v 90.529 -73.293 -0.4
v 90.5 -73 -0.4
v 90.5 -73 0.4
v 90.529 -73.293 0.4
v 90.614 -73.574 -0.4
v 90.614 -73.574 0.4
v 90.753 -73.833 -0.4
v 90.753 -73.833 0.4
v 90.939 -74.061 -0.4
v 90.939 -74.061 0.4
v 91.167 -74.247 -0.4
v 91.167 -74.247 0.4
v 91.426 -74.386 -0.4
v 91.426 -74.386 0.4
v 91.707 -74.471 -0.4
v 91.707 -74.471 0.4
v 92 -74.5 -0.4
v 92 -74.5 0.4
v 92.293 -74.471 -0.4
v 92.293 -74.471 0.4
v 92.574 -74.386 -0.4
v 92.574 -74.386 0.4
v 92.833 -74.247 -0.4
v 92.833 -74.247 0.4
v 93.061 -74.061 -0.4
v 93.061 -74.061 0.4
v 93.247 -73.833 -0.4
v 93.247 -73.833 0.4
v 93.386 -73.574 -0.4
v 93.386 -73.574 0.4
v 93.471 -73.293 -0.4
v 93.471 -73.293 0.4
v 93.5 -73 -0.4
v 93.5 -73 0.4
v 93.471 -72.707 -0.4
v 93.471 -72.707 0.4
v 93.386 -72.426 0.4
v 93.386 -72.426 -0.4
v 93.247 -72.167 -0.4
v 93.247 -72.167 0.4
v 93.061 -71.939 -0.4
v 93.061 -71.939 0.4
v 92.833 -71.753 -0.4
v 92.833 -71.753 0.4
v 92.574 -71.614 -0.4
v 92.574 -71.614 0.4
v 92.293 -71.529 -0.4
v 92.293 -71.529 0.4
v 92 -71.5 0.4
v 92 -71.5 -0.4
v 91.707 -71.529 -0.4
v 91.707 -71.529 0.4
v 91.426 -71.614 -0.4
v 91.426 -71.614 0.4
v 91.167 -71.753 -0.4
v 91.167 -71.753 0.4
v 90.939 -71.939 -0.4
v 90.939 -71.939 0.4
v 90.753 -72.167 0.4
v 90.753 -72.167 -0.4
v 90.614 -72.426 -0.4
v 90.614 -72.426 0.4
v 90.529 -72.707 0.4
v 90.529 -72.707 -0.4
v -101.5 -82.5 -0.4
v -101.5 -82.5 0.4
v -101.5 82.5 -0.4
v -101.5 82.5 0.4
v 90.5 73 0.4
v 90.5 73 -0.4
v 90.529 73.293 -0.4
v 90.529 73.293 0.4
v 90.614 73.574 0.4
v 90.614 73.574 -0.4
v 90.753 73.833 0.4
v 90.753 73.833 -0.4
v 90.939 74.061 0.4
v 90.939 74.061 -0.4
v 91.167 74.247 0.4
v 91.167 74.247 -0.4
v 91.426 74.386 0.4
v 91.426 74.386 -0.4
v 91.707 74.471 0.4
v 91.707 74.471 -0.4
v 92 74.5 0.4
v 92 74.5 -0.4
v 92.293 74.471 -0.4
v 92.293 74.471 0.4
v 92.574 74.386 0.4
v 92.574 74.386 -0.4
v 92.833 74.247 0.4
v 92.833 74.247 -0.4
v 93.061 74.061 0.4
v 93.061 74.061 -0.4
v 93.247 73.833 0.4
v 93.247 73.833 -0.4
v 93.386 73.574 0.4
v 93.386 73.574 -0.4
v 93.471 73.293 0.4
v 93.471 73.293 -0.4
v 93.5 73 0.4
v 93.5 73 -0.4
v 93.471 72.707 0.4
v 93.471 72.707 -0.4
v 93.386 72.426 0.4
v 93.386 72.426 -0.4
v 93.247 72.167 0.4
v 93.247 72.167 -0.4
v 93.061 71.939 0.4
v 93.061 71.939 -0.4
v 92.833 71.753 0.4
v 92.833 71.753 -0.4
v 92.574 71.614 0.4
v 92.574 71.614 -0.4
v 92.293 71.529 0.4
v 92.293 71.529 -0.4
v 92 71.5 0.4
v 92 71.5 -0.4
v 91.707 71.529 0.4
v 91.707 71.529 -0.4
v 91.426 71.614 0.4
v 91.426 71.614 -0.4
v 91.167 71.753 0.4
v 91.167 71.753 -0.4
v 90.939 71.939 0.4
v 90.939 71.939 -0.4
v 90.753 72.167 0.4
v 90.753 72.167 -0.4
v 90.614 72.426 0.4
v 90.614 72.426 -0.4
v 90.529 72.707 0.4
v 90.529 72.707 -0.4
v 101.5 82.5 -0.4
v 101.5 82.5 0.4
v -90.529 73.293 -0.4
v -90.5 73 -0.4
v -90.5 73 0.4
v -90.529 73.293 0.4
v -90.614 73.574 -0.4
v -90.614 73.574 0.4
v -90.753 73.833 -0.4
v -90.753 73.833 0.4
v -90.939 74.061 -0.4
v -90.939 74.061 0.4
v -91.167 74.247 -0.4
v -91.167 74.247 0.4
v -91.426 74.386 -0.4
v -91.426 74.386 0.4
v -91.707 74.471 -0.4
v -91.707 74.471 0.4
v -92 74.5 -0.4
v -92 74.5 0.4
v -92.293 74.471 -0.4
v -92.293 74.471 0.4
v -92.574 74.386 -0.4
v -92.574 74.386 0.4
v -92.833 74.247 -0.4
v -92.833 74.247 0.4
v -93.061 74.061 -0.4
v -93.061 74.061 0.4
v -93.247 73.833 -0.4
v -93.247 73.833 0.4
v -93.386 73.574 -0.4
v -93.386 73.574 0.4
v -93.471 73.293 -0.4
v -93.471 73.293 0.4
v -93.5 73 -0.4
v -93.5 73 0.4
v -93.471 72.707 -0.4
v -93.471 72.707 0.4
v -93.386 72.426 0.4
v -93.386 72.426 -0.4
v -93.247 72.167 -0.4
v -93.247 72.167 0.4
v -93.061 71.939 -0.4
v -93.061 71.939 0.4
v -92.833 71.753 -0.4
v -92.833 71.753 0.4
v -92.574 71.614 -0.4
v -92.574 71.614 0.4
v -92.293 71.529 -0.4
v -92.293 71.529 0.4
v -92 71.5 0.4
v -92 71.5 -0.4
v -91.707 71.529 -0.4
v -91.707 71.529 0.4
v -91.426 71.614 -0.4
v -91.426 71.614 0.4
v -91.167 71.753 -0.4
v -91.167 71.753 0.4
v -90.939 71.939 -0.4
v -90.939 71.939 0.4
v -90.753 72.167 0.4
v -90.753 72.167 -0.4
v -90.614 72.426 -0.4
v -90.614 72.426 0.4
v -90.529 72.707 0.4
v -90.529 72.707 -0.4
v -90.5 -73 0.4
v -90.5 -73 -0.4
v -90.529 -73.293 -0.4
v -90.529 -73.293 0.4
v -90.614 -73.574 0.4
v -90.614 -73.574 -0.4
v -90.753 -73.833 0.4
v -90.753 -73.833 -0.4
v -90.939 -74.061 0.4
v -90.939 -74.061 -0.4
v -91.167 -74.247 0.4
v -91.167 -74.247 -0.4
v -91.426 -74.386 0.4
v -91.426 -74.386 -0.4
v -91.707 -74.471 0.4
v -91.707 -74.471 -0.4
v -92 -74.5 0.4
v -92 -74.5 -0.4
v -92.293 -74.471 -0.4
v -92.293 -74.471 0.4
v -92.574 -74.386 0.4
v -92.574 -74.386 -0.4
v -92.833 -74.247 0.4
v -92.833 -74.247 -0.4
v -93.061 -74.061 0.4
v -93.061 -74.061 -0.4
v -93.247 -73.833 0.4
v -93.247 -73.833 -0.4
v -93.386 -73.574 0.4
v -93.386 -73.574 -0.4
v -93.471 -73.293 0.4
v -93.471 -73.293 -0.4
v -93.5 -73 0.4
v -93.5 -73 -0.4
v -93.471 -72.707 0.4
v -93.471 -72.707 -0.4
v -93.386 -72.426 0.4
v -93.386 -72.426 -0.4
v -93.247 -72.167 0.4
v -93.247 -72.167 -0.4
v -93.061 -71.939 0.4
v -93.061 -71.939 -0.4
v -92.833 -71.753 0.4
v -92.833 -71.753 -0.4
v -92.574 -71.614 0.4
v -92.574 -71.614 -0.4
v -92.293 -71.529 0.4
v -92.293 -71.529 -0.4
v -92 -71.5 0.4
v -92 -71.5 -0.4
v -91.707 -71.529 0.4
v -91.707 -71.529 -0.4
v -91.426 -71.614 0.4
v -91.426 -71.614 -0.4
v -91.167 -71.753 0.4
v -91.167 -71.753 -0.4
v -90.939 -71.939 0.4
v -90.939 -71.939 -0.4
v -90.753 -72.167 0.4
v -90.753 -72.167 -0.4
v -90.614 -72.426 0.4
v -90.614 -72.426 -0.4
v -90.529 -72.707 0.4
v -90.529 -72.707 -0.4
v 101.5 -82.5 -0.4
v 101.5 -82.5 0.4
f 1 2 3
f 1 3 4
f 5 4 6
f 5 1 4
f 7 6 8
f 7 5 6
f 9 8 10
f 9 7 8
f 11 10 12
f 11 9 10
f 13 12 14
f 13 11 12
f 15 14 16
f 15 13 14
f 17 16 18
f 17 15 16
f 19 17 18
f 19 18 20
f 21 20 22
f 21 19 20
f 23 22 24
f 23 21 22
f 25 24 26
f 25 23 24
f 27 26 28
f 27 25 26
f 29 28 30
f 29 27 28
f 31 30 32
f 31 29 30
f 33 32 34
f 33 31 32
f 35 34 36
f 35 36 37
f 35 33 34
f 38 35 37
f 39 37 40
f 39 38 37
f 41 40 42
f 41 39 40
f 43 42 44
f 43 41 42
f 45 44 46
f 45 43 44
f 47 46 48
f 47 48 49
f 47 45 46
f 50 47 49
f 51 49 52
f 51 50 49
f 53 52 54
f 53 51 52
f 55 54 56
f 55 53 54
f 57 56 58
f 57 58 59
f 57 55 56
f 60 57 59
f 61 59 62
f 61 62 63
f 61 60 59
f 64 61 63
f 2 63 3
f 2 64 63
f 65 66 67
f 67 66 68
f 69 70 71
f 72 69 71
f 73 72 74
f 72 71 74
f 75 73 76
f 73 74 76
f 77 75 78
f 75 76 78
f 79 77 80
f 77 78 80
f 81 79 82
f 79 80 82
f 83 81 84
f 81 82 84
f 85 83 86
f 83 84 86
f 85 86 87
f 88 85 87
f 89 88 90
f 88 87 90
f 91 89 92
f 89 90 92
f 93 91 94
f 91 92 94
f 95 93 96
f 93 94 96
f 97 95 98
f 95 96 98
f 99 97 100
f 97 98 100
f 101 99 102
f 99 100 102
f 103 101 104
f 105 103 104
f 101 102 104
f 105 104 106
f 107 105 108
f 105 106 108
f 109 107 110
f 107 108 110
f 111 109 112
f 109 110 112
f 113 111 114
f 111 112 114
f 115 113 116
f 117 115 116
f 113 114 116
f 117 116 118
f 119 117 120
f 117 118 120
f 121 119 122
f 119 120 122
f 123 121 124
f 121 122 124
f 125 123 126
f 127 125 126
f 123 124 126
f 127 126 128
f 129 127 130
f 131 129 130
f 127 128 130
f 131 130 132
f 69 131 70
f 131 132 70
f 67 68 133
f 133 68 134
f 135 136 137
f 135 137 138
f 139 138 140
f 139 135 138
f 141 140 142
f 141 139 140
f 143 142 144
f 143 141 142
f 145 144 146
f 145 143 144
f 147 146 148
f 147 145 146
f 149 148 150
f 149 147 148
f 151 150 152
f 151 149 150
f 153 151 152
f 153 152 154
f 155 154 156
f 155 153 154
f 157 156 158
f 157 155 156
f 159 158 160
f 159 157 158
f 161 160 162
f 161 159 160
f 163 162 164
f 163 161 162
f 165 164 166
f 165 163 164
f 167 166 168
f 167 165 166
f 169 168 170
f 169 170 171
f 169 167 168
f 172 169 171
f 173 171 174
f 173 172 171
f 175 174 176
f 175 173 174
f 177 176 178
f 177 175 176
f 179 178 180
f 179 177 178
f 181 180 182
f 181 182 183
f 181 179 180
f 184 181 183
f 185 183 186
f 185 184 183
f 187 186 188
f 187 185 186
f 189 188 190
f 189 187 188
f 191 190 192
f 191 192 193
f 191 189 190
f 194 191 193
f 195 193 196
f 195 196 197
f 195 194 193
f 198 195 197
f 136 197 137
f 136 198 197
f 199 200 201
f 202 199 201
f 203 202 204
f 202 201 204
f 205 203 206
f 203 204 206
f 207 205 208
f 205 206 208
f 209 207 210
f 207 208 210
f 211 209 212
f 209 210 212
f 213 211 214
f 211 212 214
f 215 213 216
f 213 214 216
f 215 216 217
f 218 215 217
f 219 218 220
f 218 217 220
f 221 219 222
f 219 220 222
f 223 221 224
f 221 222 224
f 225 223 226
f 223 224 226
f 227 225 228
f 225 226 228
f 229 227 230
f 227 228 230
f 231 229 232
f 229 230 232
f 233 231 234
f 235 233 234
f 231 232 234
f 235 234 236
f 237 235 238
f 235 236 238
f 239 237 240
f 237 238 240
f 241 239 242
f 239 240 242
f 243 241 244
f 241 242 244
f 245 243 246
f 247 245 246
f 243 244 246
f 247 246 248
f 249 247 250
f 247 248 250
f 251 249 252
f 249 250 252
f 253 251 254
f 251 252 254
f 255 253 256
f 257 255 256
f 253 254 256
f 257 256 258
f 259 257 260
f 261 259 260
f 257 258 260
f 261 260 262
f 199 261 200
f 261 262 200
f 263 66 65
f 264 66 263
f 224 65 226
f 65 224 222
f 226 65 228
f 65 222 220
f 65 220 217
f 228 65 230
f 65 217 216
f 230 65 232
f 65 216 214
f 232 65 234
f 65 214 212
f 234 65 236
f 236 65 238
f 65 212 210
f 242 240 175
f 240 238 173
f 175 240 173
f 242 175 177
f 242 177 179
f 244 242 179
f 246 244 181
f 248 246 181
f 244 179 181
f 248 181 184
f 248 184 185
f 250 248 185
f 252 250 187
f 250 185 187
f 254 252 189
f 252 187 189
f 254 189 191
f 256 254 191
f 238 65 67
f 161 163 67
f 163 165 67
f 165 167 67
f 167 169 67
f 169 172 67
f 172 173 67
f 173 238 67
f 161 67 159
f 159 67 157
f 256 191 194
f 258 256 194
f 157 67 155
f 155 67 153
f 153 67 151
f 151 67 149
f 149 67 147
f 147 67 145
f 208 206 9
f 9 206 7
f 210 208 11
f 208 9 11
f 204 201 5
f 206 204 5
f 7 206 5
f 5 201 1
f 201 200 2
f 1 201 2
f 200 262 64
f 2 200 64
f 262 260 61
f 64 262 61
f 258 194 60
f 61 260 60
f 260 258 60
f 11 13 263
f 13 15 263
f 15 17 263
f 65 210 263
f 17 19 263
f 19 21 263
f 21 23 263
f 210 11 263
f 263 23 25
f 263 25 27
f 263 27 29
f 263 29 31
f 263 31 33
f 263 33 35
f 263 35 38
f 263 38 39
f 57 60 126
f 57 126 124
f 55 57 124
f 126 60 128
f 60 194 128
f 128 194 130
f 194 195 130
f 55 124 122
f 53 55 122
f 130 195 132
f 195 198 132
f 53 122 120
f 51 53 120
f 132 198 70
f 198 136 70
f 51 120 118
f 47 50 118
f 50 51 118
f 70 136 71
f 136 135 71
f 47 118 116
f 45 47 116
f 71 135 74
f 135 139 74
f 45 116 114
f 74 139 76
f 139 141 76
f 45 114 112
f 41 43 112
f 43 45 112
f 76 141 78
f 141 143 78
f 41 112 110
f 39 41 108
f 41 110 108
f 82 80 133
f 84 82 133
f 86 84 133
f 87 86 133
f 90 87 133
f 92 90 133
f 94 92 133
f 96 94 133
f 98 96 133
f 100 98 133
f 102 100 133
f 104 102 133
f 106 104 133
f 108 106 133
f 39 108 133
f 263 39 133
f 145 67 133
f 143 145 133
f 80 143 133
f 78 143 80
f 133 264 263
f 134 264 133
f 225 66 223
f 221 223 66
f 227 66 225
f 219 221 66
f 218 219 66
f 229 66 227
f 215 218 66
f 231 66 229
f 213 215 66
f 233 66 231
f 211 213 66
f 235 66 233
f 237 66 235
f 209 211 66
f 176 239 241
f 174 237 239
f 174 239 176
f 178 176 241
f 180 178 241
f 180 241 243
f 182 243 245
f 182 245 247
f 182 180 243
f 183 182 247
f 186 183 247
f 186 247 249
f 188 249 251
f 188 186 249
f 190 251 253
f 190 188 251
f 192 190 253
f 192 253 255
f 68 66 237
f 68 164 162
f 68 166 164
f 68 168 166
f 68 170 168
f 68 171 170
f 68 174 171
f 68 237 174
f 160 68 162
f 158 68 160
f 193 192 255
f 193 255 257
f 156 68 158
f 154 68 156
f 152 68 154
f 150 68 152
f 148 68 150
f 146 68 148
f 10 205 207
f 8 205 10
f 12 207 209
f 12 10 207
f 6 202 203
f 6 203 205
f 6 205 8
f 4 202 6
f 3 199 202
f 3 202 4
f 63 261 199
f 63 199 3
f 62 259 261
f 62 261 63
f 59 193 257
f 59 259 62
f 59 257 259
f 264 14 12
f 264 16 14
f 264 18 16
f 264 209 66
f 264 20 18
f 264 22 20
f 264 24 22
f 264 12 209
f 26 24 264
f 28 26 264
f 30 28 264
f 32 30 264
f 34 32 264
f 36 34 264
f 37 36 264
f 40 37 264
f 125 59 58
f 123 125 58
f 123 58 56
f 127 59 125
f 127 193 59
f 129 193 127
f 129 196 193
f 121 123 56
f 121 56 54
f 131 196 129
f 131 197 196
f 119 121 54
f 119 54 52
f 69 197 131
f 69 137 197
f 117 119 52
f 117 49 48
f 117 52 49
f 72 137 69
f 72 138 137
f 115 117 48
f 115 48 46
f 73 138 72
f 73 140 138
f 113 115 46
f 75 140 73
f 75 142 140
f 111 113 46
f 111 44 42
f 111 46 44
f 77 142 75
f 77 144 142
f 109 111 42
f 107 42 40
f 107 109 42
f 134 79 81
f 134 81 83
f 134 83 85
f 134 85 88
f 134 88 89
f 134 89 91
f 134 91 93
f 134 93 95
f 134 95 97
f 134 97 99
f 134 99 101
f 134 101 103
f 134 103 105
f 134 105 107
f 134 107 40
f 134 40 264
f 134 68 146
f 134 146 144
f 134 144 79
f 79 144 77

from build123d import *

# Parameters (mm, degrees)
SKETCH1_W               = 203
SKETCH1_H               = 165
BASE_EXTRUDE_DEPTH      = 0.4
HOLE1_START             = -0.4
HOLE1_OUTLINE_R         = 1.5
HOLE1_DEPTH             = 0.8
MIRROR2_START           = -0.4
MIRROR2_COPY_1_SKETCH_R = 1.5
MIRROR2_COPY_1_DEPTH    = 0.8


# Read off the part's stored shape, not the designer's step: Hole1
with BuildPart() as part:
    # Sketch1 → Base-Extrude (new, symmetric)
    with BuildSketch(Plane.XY):
        Rectangle(SKETCH1_W, SKETCH1_H)
    extrude(amount=BASE_EXTRUDE_DEPTH, both=True)

    # Hole1 outline → Hole1 (cut)
    with BuildSketch(Plane.XY.offset(HOLE1_START)):
        with Locations((-92, 73)):
            Circle(HOLE1_OUTLINE_R)
    hole1 = extrude(amount=HOLE1_DEPTH, mode=Mode.SUBTRACT)

    # Mirror1: Hole1 across plane
    add(hole1.mirror(Plane.ZX), mode=Mode.SUBTRACT)

    # Mirror2: Hole1 across plane
    add(hole1.mirror(Plane(origin=(0, 0, 0), x_dir=(0, 0, 1), z_dir=(1, 0, 0))), mode=Mode.SUBTRACT)

    # Mirror2 copy 1 sketch → Mirror2 copy 1 (cut)
    with BuildSketch(Plane(origin=(0, 0, 0), x_dir=(-1, 0, 0), z_dir=(0, 0, 1)).offset(MIRROR2_START)):
        with Locations((-92, 73)):
            Circle(MIRROR2_COPY_1_SKETCH_R)
    extrude(amount=MIRROR2_COPY_1_DEPTH, mode=Mode.SUBTRACT)


solid = part.part
